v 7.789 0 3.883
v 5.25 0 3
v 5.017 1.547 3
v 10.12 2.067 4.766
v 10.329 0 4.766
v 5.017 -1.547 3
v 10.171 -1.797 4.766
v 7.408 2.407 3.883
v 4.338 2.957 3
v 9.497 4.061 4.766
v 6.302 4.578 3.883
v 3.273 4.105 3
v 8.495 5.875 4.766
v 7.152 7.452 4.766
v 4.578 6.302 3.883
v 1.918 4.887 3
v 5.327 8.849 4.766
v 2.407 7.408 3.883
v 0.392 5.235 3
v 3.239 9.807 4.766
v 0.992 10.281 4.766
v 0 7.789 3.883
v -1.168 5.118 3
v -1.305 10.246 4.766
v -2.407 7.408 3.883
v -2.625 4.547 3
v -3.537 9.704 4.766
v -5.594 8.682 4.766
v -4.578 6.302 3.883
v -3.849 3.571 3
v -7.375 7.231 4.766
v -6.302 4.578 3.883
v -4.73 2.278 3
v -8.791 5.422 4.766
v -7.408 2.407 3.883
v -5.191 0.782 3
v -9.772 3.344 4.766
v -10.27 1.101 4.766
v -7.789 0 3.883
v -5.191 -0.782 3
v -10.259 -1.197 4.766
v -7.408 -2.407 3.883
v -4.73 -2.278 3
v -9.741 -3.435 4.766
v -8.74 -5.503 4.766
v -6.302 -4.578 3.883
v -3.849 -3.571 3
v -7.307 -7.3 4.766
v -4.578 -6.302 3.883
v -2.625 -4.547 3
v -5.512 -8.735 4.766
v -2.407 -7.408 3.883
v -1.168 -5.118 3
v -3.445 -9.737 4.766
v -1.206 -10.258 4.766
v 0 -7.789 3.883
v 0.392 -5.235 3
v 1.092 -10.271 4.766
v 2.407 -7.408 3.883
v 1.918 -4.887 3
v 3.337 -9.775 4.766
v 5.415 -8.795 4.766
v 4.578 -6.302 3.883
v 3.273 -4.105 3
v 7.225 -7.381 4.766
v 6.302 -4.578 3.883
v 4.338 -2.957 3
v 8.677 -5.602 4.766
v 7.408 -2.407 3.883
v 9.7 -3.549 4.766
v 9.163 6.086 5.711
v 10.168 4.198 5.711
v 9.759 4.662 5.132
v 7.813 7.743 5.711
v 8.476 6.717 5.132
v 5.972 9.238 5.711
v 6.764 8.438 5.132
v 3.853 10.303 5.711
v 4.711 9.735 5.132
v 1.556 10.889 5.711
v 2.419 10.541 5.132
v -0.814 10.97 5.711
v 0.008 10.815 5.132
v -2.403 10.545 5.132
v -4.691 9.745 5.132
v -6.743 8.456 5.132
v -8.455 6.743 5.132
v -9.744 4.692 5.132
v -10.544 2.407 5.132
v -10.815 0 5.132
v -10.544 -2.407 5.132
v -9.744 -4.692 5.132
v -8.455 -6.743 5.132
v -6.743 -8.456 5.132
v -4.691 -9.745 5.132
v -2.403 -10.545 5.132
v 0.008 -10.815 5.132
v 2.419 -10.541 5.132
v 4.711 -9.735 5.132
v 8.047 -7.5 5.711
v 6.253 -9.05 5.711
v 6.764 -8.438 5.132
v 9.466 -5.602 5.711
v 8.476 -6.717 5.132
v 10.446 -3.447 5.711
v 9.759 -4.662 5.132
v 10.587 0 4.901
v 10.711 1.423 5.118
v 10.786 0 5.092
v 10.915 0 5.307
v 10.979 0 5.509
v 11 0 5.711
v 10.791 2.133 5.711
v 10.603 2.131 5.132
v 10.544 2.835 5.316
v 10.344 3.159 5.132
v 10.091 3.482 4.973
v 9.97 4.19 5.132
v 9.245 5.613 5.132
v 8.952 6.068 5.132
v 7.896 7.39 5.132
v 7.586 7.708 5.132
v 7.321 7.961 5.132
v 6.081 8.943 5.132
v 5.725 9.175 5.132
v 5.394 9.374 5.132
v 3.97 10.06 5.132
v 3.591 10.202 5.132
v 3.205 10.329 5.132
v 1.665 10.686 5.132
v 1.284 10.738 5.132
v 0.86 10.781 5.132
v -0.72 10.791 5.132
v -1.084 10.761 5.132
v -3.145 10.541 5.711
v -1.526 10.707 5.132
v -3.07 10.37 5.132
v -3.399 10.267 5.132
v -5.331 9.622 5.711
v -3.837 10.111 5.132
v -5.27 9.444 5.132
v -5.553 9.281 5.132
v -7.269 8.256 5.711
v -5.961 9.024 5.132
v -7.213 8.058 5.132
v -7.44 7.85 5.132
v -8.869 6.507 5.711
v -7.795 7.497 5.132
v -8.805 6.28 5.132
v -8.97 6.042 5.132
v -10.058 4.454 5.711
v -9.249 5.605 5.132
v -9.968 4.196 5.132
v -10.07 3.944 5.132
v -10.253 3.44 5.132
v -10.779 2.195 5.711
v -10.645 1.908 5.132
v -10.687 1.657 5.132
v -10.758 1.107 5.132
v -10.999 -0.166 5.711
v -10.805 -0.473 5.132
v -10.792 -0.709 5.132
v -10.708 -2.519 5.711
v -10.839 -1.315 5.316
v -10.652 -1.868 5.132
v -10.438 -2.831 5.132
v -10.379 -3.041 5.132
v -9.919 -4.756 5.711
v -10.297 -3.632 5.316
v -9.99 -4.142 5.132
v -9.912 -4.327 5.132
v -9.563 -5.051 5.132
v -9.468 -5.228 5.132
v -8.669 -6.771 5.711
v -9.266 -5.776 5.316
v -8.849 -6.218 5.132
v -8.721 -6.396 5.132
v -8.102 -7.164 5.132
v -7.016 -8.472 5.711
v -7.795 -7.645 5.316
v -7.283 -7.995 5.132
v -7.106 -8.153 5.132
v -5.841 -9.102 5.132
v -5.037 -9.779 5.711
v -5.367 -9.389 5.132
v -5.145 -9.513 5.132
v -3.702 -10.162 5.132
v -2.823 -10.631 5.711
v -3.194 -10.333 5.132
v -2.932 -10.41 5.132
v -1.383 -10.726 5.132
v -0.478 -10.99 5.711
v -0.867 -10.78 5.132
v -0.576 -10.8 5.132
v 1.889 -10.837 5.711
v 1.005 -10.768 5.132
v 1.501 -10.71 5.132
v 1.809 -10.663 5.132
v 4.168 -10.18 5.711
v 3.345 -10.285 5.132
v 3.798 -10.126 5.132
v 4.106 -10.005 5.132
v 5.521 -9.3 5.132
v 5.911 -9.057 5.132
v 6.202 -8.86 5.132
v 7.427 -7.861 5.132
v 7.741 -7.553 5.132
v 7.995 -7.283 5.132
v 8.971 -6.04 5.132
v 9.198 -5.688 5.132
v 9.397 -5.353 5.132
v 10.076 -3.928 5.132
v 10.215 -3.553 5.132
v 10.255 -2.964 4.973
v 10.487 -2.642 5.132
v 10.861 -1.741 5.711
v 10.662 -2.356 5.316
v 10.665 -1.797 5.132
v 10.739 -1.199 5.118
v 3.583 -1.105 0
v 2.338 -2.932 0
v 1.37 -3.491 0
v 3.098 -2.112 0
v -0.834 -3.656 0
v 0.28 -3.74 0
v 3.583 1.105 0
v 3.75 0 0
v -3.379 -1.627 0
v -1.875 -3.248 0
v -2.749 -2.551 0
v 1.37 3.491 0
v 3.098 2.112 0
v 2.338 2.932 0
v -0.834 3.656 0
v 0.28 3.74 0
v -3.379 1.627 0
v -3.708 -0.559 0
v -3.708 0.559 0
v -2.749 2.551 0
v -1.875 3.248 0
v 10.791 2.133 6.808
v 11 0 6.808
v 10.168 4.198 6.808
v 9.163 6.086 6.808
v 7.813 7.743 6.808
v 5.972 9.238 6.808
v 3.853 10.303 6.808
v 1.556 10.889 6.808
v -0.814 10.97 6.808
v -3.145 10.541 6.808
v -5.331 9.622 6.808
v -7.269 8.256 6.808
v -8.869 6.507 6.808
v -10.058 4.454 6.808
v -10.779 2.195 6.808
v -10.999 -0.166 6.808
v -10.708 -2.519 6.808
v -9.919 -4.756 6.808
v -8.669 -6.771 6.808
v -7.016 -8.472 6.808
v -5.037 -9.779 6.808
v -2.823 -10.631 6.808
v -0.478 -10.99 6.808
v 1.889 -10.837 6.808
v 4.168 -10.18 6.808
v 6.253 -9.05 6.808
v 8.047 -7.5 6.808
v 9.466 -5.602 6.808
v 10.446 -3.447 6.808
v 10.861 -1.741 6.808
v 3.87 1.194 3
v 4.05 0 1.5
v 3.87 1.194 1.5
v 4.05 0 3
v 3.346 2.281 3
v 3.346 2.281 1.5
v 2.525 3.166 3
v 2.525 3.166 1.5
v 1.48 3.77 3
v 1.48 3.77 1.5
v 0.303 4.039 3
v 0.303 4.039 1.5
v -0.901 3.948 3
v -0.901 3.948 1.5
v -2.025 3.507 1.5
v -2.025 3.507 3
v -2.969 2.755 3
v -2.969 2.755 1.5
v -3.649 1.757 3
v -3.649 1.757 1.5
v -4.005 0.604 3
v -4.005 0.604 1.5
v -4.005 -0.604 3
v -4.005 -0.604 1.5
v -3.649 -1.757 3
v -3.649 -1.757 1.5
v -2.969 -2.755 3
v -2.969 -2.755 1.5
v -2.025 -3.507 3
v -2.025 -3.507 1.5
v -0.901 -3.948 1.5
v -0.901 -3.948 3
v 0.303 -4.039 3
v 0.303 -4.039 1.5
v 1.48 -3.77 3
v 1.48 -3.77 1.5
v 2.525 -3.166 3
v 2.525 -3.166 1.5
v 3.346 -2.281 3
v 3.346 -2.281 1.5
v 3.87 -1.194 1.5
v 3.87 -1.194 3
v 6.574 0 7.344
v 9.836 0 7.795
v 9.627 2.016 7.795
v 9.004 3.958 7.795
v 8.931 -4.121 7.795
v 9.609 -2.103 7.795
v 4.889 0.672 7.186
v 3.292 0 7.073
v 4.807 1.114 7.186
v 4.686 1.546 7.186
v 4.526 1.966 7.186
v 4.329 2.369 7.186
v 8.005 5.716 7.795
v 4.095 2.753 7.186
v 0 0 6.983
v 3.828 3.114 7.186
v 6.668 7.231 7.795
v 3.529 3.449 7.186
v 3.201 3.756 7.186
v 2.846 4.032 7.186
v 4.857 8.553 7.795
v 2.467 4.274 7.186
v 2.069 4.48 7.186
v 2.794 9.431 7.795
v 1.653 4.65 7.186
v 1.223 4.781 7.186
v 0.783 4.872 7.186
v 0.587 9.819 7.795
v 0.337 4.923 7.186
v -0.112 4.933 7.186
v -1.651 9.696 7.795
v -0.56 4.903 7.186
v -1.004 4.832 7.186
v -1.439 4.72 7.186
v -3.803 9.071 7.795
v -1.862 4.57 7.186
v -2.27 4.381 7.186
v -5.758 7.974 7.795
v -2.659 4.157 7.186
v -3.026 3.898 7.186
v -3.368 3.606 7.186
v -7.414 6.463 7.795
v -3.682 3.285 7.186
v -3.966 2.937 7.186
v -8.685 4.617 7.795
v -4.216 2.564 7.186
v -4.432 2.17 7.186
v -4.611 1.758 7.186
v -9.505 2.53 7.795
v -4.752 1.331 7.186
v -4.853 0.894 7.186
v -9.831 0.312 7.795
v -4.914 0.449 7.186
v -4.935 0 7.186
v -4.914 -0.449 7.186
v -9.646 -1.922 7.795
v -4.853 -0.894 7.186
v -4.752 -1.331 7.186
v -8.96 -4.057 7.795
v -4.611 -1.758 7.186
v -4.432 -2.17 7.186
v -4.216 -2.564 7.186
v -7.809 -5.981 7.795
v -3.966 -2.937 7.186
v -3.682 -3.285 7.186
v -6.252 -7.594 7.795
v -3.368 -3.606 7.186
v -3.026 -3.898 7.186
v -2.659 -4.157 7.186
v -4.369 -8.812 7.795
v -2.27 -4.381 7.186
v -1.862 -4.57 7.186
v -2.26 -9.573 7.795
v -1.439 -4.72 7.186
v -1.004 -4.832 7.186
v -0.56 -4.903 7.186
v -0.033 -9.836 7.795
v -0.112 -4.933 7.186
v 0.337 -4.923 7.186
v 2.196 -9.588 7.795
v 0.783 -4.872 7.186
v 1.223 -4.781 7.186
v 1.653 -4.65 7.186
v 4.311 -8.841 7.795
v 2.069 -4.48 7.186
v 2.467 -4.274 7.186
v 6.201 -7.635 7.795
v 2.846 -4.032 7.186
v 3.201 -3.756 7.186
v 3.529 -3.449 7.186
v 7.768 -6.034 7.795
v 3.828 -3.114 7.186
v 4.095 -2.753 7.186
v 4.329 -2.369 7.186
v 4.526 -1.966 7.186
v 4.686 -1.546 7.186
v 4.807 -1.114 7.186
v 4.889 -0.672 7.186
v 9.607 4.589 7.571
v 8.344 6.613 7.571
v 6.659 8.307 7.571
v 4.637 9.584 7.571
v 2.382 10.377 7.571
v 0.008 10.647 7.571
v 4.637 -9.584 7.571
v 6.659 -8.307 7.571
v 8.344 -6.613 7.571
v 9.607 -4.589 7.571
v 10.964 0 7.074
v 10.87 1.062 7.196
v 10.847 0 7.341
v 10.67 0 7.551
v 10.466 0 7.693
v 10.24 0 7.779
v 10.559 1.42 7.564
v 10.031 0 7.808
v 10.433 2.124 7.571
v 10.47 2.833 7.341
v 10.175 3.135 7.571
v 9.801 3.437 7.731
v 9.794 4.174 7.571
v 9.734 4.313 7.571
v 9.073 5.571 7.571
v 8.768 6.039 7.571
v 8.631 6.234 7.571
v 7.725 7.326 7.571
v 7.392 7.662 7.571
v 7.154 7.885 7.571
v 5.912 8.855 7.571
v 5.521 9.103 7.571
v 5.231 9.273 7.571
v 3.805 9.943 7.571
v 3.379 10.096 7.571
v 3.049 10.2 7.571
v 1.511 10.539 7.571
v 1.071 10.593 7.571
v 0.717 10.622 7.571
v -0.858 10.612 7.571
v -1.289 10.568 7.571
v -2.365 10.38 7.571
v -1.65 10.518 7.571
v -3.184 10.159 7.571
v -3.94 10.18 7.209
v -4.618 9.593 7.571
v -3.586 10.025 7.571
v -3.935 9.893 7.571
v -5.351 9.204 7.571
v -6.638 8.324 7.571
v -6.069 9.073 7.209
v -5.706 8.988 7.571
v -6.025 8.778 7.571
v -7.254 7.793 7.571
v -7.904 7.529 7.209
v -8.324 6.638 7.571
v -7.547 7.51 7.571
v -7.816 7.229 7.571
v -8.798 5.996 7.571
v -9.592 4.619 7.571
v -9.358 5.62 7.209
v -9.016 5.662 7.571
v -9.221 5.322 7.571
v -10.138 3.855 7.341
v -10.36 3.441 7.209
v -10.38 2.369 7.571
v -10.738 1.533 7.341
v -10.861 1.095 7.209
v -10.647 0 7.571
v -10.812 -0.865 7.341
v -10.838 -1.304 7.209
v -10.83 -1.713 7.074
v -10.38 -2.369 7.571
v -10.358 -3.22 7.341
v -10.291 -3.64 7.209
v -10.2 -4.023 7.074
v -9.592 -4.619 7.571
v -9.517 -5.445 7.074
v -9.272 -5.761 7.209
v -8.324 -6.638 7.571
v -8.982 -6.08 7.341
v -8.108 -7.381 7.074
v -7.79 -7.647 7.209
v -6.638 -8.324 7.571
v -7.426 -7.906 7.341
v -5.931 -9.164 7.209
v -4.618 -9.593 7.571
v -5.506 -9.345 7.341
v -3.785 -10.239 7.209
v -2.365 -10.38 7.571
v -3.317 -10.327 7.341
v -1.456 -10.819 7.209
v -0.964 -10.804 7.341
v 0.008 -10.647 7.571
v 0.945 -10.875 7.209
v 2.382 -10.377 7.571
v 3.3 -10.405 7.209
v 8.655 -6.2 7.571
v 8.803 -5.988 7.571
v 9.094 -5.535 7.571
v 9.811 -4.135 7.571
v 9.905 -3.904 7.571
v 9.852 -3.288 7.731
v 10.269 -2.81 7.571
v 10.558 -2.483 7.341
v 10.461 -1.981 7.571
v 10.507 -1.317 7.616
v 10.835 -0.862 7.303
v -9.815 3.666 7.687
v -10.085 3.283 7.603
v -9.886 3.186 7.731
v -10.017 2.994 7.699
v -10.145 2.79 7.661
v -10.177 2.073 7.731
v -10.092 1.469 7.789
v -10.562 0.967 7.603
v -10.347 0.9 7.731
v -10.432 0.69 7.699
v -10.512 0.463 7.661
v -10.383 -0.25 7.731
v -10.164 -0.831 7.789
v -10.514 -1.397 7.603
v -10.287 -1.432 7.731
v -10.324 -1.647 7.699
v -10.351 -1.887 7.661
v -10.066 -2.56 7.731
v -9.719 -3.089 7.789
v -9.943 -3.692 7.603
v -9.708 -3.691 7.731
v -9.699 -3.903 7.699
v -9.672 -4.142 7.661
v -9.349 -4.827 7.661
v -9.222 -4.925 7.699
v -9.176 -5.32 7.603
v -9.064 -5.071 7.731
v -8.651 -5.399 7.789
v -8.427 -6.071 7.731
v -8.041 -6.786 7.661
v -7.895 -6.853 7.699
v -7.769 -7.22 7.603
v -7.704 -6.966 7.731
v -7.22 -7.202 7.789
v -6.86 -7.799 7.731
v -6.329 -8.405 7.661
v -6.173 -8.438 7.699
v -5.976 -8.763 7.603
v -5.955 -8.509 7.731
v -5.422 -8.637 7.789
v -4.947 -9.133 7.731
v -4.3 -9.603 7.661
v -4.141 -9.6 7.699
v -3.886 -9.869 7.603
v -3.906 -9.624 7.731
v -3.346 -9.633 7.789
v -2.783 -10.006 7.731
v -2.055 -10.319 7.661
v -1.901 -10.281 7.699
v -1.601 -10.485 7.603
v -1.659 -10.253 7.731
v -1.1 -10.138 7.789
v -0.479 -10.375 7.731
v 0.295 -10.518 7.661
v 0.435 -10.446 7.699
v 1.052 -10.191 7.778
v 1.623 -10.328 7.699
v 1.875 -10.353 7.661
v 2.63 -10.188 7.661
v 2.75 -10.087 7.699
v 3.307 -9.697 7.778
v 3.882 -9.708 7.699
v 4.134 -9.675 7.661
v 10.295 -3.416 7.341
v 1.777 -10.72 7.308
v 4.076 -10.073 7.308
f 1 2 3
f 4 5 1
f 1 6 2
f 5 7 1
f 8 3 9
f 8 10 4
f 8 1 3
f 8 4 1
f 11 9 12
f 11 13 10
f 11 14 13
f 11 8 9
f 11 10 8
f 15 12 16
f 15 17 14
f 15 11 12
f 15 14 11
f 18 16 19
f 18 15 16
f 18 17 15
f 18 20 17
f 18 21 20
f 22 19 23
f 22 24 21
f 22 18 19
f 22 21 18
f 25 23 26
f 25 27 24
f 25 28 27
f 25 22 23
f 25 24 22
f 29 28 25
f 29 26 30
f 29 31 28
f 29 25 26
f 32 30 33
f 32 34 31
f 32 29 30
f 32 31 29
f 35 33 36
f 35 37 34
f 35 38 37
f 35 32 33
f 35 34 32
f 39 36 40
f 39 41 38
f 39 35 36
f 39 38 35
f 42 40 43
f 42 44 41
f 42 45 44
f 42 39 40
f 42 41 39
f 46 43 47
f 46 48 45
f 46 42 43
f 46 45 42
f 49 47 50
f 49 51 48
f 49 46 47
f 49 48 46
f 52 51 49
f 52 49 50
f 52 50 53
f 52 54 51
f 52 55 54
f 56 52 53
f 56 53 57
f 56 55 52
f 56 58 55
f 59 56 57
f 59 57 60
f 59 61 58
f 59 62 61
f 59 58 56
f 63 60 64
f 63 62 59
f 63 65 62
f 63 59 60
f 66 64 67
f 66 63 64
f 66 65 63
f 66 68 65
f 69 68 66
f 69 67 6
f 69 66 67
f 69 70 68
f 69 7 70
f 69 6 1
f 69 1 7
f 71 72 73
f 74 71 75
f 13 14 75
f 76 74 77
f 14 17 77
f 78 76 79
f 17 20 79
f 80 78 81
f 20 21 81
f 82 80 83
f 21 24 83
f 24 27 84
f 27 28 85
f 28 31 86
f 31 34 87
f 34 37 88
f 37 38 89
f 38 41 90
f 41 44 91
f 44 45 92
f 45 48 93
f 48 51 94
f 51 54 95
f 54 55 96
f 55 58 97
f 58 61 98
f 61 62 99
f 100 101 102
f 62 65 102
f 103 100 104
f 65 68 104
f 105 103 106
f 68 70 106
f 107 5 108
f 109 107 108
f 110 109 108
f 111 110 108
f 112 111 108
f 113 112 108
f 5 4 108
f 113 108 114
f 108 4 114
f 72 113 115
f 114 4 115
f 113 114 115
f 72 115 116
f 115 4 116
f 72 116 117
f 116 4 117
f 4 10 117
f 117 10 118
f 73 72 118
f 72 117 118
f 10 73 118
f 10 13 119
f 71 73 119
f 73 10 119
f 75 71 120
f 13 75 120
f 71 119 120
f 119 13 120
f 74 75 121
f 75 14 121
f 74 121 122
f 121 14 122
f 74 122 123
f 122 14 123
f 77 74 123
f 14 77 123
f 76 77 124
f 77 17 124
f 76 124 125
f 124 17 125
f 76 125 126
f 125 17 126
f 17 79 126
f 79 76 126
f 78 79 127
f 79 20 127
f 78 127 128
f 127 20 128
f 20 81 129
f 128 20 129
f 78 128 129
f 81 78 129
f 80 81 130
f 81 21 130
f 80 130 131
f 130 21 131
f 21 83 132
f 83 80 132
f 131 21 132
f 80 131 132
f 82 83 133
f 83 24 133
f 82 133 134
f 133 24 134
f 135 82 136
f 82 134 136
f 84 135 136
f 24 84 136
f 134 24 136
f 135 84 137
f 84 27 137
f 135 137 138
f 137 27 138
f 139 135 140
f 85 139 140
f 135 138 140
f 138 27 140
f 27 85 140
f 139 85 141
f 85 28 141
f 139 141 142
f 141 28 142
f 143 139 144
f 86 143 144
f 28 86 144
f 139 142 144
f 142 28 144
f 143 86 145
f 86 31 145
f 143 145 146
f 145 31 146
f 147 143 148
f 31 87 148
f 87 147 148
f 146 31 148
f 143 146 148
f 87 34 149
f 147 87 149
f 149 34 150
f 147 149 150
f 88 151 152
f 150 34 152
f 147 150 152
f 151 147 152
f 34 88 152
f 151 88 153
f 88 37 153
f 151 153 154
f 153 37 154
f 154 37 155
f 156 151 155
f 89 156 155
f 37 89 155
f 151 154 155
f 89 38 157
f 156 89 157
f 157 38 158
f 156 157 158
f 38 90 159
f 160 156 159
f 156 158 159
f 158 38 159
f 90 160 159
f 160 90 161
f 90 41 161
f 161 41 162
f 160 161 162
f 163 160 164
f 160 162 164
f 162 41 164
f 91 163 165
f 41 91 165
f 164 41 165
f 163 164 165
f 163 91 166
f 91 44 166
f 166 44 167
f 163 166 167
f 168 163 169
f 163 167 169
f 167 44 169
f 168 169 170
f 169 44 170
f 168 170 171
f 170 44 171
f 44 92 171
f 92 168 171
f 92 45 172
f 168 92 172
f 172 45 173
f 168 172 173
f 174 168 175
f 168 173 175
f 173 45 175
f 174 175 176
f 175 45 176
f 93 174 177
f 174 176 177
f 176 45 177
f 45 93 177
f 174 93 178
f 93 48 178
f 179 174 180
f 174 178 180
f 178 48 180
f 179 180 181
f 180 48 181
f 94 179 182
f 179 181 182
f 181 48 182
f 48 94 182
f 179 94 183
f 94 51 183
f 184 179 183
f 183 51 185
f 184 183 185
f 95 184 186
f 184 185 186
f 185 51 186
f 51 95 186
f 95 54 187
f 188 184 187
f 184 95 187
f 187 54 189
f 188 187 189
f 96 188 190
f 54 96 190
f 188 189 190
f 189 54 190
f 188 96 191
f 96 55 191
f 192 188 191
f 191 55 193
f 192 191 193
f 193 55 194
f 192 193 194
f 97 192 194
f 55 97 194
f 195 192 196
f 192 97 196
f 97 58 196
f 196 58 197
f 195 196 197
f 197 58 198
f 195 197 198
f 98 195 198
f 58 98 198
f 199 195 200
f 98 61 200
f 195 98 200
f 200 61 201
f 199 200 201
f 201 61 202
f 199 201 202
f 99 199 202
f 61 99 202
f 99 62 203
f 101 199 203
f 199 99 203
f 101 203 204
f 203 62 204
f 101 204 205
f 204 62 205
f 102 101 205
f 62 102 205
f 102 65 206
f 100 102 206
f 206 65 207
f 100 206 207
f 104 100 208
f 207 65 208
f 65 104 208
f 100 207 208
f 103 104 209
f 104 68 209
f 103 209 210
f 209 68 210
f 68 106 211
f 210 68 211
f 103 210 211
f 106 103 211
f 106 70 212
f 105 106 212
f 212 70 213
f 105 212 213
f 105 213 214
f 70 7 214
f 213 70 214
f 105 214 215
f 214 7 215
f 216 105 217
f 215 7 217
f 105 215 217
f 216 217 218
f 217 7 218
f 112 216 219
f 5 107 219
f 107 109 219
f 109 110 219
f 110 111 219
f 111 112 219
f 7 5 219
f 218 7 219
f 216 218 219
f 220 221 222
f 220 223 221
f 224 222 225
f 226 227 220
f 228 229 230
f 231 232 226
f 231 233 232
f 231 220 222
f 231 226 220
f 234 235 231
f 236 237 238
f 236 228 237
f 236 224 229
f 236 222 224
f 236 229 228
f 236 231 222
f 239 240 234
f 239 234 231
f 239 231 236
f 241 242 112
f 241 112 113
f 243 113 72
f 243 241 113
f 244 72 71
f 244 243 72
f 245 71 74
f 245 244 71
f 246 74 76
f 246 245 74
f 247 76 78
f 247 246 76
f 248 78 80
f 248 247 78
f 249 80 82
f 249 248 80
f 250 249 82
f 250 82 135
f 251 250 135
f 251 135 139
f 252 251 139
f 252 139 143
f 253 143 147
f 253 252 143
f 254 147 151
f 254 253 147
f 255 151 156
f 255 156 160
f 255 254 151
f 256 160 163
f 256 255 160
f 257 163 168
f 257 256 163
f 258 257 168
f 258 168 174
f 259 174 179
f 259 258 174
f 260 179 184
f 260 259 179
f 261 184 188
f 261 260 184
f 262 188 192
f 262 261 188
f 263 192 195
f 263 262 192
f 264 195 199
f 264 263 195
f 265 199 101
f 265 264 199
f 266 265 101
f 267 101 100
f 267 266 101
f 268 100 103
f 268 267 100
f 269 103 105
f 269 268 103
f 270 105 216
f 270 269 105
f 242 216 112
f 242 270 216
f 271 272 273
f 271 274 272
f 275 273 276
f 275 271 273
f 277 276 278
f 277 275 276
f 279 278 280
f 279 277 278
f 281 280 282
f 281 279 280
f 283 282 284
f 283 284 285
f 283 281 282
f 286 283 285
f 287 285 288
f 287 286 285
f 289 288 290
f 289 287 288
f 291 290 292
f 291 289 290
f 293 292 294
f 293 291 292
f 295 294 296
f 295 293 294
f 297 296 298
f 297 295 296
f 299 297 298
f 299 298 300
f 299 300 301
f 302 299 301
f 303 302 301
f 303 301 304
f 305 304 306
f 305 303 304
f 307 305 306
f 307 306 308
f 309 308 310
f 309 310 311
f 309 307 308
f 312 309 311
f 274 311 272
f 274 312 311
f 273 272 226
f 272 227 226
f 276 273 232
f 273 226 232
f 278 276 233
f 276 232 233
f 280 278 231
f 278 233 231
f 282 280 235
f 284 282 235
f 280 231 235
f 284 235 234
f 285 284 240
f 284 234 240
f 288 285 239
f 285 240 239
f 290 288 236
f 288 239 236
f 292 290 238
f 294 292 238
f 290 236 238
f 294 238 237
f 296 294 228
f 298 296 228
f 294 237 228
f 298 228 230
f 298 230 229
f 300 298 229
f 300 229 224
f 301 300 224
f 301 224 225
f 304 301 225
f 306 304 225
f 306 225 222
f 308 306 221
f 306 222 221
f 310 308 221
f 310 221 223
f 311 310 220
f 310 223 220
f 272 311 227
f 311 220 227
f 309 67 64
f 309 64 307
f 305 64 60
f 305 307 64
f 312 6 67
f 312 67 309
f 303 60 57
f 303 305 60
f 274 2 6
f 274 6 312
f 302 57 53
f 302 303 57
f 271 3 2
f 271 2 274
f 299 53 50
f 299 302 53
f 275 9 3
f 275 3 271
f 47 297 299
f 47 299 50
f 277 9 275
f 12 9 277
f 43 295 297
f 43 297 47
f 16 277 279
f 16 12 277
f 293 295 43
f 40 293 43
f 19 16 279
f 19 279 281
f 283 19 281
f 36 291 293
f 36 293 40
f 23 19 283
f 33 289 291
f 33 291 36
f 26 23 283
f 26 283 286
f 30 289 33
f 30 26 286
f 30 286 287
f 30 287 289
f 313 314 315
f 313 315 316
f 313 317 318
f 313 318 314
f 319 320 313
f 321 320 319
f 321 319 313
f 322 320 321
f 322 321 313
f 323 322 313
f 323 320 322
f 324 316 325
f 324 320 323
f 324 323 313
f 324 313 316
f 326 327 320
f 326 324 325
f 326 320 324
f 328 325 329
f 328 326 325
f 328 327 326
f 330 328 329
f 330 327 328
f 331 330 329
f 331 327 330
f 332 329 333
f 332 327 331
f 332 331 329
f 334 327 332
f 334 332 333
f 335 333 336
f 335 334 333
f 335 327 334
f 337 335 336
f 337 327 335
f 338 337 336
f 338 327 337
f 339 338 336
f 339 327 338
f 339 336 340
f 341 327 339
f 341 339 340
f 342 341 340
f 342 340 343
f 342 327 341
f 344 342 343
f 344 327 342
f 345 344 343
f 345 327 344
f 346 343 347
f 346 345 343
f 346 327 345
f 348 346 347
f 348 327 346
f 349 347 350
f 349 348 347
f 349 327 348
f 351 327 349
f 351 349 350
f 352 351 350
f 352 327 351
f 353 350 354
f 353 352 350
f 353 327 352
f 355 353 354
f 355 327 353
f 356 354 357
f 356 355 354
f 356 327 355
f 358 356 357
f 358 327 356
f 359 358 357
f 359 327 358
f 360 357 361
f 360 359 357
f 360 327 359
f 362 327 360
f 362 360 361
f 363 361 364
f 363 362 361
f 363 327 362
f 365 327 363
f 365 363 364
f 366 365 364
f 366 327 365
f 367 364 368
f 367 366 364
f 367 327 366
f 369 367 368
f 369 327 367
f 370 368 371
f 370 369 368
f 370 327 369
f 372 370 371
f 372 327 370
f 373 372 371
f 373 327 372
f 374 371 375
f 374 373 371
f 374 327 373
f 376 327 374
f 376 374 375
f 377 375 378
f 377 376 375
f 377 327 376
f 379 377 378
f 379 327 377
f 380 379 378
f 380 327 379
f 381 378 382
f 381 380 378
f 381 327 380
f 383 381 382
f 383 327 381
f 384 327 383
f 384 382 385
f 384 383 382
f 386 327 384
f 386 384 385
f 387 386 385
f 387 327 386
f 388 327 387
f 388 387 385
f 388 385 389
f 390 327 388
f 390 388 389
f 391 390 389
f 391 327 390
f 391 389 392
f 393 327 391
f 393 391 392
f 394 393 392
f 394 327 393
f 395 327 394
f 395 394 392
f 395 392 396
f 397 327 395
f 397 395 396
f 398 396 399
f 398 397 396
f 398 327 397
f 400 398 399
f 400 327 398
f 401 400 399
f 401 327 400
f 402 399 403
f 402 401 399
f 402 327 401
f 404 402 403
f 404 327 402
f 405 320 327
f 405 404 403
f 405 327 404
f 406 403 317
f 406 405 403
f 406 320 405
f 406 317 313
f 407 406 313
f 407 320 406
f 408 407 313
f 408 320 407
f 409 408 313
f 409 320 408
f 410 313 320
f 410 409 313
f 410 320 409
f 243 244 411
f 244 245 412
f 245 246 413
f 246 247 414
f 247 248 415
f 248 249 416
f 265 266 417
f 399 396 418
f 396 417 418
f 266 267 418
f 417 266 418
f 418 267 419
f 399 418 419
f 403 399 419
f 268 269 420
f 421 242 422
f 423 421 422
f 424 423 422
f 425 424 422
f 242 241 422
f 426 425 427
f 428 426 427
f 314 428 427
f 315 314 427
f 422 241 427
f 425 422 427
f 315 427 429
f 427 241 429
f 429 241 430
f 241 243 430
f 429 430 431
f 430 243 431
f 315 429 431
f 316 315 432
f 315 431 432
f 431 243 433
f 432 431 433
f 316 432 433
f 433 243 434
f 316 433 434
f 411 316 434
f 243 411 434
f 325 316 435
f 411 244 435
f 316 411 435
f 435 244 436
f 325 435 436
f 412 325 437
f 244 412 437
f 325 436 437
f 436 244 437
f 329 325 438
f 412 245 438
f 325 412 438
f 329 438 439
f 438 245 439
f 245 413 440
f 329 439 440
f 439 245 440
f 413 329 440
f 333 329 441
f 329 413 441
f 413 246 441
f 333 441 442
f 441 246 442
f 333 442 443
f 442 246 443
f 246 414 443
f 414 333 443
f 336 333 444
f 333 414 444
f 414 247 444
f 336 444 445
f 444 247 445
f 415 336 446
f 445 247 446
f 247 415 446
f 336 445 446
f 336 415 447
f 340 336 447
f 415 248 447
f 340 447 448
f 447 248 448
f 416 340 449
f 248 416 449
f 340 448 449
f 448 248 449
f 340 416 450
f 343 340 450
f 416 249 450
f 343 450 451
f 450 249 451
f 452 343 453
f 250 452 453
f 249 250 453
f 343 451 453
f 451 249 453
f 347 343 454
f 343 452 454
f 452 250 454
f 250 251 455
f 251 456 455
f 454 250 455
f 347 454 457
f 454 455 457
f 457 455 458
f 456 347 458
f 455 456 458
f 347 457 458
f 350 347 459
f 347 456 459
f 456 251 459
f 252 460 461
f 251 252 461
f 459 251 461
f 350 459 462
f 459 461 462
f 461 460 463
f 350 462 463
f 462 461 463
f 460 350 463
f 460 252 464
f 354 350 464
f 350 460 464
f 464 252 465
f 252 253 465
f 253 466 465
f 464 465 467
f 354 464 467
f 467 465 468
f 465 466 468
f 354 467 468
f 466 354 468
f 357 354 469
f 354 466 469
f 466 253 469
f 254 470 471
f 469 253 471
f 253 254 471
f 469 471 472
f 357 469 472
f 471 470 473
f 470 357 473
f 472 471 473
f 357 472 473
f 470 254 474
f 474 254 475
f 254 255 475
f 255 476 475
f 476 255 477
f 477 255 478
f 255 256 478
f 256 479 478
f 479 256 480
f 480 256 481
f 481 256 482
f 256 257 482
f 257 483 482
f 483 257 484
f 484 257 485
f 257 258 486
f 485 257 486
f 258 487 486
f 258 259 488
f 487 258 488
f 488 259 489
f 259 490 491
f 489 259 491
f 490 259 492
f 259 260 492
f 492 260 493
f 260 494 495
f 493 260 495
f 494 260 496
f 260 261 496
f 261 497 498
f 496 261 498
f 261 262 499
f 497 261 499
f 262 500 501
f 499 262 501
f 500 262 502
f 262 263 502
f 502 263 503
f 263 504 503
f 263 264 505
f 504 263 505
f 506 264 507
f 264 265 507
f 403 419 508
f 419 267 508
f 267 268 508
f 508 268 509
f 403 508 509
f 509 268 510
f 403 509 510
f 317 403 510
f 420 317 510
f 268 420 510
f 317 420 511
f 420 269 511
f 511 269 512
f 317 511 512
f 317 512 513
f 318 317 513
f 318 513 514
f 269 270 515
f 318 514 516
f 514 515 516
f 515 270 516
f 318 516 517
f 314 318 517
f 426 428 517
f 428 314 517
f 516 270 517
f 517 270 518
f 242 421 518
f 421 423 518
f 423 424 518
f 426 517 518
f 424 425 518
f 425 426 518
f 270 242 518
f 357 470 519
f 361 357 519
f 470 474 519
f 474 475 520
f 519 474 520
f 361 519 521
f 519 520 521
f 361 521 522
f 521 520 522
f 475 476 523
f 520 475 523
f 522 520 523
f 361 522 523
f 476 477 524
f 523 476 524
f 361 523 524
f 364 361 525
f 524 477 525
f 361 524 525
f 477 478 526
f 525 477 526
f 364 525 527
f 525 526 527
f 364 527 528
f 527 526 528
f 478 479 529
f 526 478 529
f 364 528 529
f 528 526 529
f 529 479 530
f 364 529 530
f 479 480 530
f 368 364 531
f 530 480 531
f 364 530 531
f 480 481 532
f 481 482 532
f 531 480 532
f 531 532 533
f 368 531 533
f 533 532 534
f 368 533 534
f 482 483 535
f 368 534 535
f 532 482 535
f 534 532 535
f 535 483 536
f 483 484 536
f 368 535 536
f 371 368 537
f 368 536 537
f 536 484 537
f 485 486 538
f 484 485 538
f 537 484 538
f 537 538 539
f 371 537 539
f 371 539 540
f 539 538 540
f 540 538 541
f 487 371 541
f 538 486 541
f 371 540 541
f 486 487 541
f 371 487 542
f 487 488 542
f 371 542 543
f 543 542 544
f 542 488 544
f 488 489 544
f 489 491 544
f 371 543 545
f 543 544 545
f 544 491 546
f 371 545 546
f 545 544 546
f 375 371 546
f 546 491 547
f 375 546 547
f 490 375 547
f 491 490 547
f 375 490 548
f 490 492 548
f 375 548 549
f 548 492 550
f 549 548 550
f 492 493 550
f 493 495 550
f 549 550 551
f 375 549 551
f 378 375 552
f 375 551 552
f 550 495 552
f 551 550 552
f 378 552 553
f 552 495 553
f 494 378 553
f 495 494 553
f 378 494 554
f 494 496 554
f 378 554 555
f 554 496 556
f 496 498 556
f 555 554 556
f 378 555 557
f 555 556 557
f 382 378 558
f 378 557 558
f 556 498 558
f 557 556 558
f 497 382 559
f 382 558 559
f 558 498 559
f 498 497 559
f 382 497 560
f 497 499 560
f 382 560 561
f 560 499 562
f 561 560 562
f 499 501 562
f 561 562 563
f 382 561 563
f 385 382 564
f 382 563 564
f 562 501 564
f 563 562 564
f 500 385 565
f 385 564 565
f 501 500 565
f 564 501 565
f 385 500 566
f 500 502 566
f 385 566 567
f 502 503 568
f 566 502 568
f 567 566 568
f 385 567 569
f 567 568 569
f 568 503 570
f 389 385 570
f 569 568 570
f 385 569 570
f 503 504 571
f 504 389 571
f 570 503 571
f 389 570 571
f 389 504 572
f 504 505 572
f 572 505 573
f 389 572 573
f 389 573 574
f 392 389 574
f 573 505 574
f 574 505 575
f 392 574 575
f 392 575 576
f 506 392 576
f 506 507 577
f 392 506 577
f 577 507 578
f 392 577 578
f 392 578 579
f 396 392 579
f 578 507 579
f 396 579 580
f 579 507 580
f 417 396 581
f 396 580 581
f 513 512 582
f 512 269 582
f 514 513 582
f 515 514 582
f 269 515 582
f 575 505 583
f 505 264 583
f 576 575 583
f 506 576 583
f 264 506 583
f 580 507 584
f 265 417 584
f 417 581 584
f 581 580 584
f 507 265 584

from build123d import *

# Parameters (mm, degrees)
F2_R = 1


# Not quite as in the source:
# - a fillet or chamfer that OpenCascade refuses, or shapes differently, is made with other operations: its cross-section is extruded or revolved along the edge and cut away or added


with BuildPart() as f1:
    # F0 (on Front) → F1 (revolve)
    with BuildSketch(Plane.XZ):
        with BuildLine():
            Line((0, 6.9830484122), (0, 0))
            Line((0, 0), (4.05, 0))
            Line((4.05, 0), (4.05, 3))
            Line((4.05, 3), (5.25, 3))
            Line((5.25, 3), (11, 5))
            Line((11, 5), (11, 8))
            ThreePointArc((11, 8), (5.5234543207, 7.2378272446), (0, 6.9830484122))
        make_face()
    revolve(axis=Axis((0, 0, 1.772551451), (0, 0, 1)))

    # F2
    f2_edges = [f1.edges().sort_by_distance(p)[0] for p in [
        (-11, 0, 5),
        (-11, 0, 8),
    ]]
    fillet(f2_edges, radius=F2_R)

    # F3: chamfer of 0.3 x 1.5 on 1 edges, made by hand

    # F3_s1 → F3_t2 (revolve, cut)
    with BuildSketch(Plane.XZ):
        Polygon((4.05, 1.5), (3.75, 0), (4.05, 0), align=None)
    revolve(axis=Axis((0, 0, 0), (0, 0, 1)), mode=Mode.SUBTRACT)


solid = f1.part
